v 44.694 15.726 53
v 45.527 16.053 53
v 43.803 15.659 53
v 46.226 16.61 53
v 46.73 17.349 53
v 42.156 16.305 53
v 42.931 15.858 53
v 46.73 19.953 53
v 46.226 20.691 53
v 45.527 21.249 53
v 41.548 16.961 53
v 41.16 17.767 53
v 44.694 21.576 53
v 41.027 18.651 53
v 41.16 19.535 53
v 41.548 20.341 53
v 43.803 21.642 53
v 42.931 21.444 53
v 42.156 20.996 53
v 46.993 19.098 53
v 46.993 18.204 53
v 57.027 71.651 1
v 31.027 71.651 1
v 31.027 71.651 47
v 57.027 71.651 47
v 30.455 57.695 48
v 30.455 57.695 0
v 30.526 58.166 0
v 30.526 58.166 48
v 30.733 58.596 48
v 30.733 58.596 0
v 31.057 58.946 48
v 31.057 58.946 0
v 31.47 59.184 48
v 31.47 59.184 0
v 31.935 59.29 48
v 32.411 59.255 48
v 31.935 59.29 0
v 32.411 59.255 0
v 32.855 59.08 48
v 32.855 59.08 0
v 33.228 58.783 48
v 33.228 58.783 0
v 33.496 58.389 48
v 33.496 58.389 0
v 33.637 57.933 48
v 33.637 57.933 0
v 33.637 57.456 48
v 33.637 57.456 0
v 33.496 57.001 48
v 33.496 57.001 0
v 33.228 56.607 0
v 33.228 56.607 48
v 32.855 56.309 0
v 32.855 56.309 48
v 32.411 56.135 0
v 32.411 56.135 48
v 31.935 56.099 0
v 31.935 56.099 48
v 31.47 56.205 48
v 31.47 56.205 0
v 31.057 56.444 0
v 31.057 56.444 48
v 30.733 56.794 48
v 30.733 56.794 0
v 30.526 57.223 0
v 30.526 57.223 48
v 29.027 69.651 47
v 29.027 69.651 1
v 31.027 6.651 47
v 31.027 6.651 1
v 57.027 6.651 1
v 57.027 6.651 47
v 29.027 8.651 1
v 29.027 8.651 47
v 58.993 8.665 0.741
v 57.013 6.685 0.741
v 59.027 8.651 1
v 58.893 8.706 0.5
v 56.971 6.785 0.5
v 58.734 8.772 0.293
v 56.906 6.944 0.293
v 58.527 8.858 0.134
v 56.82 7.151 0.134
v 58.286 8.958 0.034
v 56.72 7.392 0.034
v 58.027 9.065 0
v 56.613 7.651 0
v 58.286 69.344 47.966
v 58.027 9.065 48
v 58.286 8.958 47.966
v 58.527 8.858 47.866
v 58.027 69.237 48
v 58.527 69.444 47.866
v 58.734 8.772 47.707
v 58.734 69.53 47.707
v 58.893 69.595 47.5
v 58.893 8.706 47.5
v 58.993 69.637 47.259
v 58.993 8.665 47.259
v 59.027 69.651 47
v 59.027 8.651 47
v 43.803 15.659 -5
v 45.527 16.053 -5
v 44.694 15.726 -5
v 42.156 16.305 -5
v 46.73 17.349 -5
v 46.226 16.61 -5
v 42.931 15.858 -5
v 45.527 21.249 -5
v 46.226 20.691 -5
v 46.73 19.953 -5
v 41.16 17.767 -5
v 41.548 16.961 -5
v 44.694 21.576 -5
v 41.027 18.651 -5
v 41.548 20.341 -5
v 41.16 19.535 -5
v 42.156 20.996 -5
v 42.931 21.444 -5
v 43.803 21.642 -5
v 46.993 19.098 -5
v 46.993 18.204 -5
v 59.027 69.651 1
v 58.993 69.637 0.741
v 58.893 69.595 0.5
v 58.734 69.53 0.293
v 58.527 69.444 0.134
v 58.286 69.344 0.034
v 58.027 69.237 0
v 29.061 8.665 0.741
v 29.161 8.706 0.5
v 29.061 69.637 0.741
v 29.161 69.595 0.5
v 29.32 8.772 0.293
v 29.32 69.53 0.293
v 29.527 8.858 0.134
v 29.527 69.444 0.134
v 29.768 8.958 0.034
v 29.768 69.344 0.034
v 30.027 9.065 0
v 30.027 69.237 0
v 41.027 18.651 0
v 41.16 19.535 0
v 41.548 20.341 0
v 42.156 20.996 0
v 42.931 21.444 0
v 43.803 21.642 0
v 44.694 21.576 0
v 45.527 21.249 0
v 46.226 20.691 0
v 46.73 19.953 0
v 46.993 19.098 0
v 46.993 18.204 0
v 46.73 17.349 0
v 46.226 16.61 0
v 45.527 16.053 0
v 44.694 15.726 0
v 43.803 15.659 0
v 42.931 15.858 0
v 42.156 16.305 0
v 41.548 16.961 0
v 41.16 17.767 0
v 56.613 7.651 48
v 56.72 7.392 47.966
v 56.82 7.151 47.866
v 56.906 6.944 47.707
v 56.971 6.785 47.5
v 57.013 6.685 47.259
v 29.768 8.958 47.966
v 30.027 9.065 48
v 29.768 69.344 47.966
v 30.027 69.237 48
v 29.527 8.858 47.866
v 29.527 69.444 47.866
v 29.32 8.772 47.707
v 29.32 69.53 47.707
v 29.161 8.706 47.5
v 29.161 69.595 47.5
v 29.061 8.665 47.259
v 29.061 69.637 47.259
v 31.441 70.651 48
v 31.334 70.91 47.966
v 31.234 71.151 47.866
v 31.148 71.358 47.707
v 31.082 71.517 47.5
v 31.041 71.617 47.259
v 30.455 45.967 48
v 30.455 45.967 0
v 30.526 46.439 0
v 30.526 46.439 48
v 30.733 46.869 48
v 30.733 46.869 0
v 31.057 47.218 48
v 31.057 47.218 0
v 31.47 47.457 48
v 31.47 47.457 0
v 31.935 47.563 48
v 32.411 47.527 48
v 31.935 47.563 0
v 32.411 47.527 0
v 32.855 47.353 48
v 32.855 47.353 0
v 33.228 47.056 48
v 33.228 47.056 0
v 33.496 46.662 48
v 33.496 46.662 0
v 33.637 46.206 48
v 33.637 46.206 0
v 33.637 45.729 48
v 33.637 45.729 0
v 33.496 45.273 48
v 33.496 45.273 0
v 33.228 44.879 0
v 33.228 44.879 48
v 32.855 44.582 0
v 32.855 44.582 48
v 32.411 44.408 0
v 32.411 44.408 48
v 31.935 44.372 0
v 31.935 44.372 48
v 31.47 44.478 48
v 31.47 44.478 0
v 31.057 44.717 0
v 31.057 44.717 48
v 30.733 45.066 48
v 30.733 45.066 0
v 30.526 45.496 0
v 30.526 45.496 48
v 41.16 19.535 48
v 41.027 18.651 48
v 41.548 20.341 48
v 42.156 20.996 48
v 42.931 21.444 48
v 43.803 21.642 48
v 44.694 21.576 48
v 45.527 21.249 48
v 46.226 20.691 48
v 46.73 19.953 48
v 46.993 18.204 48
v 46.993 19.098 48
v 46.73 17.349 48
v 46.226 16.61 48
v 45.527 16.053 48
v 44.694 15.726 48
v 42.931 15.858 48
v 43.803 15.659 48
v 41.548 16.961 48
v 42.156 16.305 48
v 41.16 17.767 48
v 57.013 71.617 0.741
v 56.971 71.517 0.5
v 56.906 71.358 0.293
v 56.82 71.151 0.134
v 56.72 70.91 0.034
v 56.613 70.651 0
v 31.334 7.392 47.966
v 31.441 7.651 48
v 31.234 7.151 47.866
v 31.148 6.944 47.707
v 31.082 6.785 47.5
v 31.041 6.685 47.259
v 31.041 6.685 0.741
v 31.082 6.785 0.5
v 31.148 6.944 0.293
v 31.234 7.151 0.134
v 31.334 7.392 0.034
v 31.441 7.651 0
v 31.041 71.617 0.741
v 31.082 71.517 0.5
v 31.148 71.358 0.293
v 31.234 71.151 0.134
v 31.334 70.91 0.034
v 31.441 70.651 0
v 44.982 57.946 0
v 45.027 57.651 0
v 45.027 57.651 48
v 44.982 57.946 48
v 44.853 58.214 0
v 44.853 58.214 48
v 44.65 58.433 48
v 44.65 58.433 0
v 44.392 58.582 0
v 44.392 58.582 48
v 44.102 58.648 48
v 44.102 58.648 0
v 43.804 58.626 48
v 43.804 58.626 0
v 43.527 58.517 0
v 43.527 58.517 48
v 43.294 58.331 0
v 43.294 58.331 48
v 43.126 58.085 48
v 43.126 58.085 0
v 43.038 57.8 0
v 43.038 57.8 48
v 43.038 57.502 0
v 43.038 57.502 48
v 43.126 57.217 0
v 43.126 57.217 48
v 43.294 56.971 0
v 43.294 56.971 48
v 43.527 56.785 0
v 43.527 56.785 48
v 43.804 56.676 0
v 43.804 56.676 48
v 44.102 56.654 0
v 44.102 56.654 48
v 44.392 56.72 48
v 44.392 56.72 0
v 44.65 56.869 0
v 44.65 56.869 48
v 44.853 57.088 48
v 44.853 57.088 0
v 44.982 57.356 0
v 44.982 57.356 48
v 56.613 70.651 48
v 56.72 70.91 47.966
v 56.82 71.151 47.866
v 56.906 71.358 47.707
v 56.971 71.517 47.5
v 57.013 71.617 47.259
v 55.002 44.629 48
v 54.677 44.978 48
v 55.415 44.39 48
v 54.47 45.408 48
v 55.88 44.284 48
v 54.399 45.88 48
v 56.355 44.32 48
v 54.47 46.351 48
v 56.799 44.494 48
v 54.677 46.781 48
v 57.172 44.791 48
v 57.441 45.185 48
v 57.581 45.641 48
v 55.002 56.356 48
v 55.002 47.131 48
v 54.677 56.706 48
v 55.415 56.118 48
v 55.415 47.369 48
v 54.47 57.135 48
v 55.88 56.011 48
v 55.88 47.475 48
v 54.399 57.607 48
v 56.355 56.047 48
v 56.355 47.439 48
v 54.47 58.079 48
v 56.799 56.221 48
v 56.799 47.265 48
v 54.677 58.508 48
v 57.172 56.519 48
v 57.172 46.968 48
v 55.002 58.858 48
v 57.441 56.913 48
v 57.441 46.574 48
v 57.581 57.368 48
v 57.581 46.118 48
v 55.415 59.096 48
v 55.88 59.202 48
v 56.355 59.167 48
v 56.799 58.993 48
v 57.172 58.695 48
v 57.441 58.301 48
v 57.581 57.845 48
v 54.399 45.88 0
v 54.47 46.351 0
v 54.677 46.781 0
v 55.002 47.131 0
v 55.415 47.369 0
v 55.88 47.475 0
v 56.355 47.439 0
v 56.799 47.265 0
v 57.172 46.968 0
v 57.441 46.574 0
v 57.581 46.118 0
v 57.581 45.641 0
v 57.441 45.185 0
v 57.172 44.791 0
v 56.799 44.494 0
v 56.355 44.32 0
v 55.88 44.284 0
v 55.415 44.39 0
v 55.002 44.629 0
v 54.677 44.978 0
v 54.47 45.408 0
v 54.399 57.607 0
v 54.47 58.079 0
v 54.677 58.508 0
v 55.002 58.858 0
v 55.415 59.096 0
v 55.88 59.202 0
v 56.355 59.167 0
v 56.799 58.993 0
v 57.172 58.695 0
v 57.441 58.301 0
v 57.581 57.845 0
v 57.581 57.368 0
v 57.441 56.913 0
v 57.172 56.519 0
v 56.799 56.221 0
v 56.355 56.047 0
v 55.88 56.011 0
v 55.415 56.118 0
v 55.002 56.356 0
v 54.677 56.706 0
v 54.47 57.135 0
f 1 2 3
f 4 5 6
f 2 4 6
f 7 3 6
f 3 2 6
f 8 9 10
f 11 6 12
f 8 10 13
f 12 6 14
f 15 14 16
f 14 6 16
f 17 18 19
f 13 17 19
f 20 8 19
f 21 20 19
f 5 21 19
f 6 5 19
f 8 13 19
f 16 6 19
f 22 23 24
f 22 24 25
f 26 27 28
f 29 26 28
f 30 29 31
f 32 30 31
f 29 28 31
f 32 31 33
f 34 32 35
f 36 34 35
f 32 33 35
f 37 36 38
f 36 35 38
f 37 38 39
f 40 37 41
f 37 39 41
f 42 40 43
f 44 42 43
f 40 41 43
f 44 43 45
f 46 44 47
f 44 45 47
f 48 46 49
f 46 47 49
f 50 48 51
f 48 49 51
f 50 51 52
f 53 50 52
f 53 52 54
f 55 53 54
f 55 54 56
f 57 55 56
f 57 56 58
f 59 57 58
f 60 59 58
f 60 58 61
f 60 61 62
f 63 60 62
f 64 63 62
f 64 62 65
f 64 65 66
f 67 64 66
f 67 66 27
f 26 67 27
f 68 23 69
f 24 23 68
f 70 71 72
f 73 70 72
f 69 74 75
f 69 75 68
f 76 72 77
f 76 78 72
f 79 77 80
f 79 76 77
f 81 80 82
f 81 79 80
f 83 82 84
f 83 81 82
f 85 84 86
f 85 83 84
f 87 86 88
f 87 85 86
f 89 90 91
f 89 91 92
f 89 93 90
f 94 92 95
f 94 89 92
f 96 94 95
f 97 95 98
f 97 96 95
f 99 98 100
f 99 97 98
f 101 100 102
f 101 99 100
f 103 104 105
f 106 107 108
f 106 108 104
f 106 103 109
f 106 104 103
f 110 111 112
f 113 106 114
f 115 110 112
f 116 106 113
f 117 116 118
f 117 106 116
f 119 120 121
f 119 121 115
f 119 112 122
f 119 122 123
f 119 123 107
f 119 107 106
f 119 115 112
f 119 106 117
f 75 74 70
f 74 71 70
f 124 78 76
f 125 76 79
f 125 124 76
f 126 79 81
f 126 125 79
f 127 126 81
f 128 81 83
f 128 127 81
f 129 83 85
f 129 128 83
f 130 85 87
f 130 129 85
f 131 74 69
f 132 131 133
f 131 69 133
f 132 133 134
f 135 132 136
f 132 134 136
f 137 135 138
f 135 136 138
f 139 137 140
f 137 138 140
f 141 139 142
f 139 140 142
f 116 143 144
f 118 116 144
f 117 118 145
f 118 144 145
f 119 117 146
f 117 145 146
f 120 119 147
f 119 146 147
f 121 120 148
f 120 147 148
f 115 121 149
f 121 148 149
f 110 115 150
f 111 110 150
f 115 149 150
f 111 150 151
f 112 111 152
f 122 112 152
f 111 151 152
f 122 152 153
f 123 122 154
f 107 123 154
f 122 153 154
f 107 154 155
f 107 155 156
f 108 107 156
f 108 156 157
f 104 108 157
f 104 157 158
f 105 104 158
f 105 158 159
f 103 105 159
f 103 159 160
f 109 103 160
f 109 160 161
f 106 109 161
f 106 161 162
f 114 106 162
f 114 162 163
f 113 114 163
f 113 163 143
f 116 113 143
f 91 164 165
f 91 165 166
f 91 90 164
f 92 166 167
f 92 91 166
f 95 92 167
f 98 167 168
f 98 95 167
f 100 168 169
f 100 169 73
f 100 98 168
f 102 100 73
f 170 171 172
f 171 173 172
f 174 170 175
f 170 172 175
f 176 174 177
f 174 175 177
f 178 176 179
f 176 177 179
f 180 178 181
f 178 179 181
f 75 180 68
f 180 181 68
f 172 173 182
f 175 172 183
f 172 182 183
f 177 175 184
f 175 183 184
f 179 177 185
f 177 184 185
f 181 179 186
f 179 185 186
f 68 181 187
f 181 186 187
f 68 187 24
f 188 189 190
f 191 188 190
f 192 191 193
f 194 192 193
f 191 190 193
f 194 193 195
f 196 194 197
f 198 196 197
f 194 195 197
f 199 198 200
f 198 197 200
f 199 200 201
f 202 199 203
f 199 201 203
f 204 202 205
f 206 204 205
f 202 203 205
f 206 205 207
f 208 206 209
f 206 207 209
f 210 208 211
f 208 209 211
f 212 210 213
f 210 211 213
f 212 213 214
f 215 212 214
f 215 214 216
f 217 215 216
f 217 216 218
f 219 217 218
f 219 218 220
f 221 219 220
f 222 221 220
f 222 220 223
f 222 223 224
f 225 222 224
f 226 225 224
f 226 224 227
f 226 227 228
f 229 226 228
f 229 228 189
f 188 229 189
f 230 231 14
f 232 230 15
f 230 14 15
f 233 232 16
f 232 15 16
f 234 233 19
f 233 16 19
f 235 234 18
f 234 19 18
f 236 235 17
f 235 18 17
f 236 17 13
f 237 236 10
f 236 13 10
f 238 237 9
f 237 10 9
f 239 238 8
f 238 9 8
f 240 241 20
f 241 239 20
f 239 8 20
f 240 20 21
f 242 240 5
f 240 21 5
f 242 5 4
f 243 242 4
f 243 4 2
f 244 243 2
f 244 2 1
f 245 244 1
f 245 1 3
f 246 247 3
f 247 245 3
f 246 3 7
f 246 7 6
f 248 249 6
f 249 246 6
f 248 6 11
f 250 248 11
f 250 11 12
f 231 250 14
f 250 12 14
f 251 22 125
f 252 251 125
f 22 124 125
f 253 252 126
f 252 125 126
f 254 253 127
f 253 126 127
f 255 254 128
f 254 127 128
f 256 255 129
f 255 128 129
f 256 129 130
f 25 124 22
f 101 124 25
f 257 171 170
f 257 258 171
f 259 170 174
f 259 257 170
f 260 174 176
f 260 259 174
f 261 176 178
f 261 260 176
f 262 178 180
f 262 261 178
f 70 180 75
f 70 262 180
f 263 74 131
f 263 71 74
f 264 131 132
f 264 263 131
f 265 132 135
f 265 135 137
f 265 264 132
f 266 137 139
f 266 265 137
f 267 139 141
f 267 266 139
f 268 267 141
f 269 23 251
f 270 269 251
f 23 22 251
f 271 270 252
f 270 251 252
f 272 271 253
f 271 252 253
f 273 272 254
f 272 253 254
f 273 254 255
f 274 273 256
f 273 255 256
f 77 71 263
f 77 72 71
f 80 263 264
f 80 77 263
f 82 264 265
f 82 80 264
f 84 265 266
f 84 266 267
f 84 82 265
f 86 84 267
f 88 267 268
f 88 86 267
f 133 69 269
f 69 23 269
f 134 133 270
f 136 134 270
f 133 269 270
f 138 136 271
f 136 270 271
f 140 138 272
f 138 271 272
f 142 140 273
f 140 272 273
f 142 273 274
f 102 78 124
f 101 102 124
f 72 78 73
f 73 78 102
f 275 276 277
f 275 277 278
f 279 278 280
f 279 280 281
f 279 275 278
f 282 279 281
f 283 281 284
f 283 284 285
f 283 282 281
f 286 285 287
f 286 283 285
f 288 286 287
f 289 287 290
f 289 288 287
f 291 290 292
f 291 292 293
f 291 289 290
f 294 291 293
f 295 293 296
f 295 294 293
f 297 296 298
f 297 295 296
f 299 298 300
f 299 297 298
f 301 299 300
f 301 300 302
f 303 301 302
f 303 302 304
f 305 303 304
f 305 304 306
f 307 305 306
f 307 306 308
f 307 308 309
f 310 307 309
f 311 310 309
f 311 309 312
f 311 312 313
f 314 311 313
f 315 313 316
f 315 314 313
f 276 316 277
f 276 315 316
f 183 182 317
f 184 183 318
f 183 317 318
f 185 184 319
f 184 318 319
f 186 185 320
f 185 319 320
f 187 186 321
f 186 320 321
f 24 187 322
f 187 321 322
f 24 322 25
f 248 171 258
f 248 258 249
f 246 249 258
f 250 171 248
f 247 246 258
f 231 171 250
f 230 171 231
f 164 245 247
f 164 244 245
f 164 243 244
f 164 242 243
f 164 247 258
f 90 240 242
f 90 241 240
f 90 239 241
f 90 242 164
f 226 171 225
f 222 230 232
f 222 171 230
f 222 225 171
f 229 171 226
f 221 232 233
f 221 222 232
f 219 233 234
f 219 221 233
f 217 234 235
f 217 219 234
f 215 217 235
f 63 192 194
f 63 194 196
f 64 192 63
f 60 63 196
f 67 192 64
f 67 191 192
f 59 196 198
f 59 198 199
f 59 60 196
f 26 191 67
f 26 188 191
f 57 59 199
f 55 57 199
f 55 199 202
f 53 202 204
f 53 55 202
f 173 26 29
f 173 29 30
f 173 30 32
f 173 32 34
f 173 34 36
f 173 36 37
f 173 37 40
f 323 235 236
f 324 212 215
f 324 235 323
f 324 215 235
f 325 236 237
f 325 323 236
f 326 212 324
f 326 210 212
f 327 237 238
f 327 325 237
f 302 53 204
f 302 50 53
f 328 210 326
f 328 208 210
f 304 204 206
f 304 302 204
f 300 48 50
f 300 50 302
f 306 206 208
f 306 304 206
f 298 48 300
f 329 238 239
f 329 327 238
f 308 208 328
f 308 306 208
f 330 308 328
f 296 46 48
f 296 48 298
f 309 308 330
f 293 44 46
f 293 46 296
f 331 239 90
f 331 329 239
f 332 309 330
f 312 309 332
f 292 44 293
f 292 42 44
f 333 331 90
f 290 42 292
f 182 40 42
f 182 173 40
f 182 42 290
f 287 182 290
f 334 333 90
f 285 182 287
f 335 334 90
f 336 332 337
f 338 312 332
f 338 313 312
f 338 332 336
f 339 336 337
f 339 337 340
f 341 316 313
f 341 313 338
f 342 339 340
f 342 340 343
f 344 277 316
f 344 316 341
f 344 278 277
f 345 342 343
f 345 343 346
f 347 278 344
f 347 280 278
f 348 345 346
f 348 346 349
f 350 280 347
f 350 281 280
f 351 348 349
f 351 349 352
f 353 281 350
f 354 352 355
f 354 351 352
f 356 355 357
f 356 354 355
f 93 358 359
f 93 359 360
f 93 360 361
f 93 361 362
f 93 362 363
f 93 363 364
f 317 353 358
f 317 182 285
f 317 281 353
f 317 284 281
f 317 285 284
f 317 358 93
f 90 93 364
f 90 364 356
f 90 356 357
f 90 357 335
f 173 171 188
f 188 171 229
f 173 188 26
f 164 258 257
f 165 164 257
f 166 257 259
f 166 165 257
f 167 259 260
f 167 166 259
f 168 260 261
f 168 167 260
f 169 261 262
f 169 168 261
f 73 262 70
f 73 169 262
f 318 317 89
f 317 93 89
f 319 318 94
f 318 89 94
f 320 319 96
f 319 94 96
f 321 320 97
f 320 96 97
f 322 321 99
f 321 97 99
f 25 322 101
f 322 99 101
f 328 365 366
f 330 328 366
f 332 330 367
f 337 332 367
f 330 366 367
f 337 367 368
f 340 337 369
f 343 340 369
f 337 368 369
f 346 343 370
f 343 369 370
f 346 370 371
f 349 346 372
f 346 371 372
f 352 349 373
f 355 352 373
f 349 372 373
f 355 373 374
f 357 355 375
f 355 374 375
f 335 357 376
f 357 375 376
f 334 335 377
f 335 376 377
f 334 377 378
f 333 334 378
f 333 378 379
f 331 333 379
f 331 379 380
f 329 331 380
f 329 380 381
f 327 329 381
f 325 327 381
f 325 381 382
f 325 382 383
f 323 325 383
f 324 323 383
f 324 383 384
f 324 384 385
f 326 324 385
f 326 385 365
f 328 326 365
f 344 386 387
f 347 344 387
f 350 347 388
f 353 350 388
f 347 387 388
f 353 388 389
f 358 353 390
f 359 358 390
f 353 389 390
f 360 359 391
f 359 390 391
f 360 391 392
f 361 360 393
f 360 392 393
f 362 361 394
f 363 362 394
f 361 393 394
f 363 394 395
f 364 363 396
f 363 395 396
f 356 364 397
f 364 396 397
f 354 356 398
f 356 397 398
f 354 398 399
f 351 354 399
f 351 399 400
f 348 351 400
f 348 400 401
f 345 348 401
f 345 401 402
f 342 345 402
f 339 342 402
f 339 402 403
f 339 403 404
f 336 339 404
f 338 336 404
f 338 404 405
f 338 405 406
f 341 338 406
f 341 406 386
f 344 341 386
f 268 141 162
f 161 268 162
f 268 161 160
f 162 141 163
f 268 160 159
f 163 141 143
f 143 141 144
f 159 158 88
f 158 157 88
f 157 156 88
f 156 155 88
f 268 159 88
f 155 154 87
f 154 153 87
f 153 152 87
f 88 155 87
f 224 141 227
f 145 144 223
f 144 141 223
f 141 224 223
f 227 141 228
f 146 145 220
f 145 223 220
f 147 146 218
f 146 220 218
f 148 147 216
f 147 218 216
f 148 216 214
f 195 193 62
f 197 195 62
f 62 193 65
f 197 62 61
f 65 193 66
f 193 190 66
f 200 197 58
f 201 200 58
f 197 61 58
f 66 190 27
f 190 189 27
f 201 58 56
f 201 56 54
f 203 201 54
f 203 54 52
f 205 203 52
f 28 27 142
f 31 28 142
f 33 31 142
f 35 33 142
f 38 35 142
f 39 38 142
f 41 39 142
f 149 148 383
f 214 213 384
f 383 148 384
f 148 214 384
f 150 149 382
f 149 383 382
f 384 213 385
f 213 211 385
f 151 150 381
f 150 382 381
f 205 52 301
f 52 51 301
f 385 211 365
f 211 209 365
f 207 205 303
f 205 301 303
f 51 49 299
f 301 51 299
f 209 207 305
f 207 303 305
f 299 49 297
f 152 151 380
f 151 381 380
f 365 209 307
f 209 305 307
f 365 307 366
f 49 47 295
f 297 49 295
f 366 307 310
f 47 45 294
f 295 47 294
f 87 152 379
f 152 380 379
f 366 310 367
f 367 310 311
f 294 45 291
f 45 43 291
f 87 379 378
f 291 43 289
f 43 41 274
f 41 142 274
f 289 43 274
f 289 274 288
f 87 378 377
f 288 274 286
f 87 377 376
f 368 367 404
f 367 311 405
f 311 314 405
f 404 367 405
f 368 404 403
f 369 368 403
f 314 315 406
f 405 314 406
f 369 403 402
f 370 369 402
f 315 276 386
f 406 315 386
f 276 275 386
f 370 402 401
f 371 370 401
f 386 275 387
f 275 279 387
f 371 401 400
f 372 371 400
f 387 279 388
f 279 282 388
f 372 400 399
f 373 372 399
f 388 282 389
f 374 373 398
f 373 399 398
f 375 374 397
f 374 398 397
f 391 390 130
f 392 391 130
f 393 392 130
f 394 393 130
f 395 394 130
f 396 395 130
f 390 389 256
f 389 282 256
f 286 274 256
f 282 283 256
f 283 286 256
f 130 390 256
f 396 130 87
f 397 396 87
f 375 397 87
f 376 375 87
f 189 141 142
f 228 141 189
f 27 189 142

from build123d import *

# Parameters (mm, degrees)
SKETCH_1_W           = 30
SKETCH_1_H           = 65
EXTRUDE_1_DEPTH      = 48
SKETCH_2_R           = 1
CUT_EXTRUDE_1_DEPTH  = 48
EXTRUDE_2_DEPTH      = 5
EXTRUDE_2_DEPTH_BACK = 53
SKETCH_3_R           = 3
CHAMFER_1_SIZE       = 2
FILLET_1_R           = 1
FILLET_2_R           = 1
SKETCH_6_R           = 1.6
SKETCH_6_R_2         = 1
CUT_EXTRUDE_3_DEPTH  = 76


with BuildPart() as part:
    # ｽｹｯﾁ1 → ﾎﾞｽ - 押し出し1 (new body)
    with BuildSketch(Plane.XY):
        with Locations((44.026916893, 39.150883092)):
            Rectangle(SKETCH_1_W, SKETCH_1_H)
    extrude(amount=EXTRUDE_1_DEPTH)

    # ｽｹｯﾁ2 → ｶｯﾄ - 押し出し1 (cut)
    with BuildSketch(Plane.XY):
        with Locations((56.026916893, 57.650883092)):
            Circle(SKETCH_2_R)
        with Locations((32.026916893, 57.650883092)):
            Circle(SKETCH_2_R)
        with Locations((44.026916893, 57.650883092)):
            Circle(SKETCH_2_R)
        with Locations((56.023819064, 45.923533591)):
            Circle(SKETCH_2_R)
        with Locations((32.030014722, 45.923533591)):
            Circle(SKETCH_2_R)
    extrude(amount=CUT_EXTRUDE_1_DEPTH, mode=Mode.SUBTRACT)

    # ｽｹｯﾁ3 → ﾎﾞｽ - 押し出し2 (add, two sides: drawn at the far end of the back side and taken through both)
    with BuildSketch(Plane(origin=(0, 0, 0), x_dir=(-1, 0, 0), z_dir=(0, 0, -1)).offset(-EXTRUDE_2_DEPTH_BACK)):
        with Locations((-44.026916893, 18.650883092)):
            Circle(SKETCH_3_R)
    extrude(amount=EXTRUDE_2_DEPTH + EXTRUDE_2_DEPTH_BACK)

    # 面取り1
    chamfer_1_edges = [part.edges().sort_by_distance(p)[0] for p in [
        (29.026916893, 6.650883092, 24),
        (59.026916893, 6.650883092, 24),
        (59.026916893, 71.650883092, 24),
        (29.026916893, 71.650883092, 24),
    ]]
    chamfer(chamfer_1_edges, length=CHAMFER_1_SIZE)

    # ﾌｨﾚｯﾄ1
    fillet_1_edges = [part.edges().sort_by_distance(p)[0] for p in [
        (30.026916893, 70.650883092, 48),
        (44.026916893, 71.650883092, 48),
        (58.026916893, 70.650883092, 48),
        (29.026916893, 39.150883092, 48),
        (30.026916893, 7.650883092, 48),
        (44.026916893, 6.650883092, 48),
        (58.026916893, 7.650883092, 48),
        (59.026916893, 39.150883092, 48),
    ]]
    fillet(fillet_1_edges, radius=FILLET_1_R)

    # ﾌｨﾚｯﾄ2
    fillet_2_edges = [part.edges().sort_by_distance(p)[0] for p in [
        (58.026916893, 70.650883092, 0),
        (30.026916893, 70.650883092, 0),
        (44.026916893, 71.650883092, 0),
        (29.026916893, 39.150883092, 0),
        (30.026916893, 7.650883092, 0),
        (44.026916893, 6.650883092, 0),
        (58.026916893, 7.650883092, 0),
        (59.026916893, 39.150883092, 0),
    ]]
    fillet(fillet_2_edges, radius=FILLET_2_R)

    # ｽｹｯﾁ6 → ｶｯﾄ - 押し出し3 (cut)
    # profile 1 of 4: a face of its own
    with BuildSketch(Plane(origin=(0, 0, 0), x_dir=(-1, 0, 0), z_dir=(0, 0, -1))):
        with Locations((-55.99912174, 45.879603206)):
            Circle(SKETCH_6_R)
        with Locations((-56.023819064, 45.923533591)):
            Circle(SKETCH_6_R_2, mode=Mode.SUBTRACT)
    # profile 2 of 4: a face of its own
    with BuildSketch(Plane(origin=(0, 0, 0), x_dir=(-1, 0, 0), z_dir=(0, 0, -1))):
        with Locations((-32.054712046, 45.967463976)):
            Circle(SKETCH_6_R)
    # profile 3 of 4: a face of its own
    with BuildSketch(Plane(origin=(0, 0, 0), x_dir=(-1, 0, 0), z_dir=(0, 0, -1))):
        with Locations((-55.99912174, 57.606952707)):
            Circle(SKETCH_6_R)
    # profile 4 of 4: a face of its own
    with BuildSketch(Plane(origin=(0, 0, 0), x_dir=(-1, 0, 0), z_dir=(0, 0, -1))):
        with Locations((-32.054712046, 57.694813478)):
            Circle(SKETCH_6_R)
    extrude(amount=-CUT_EXTRUDE_3_DEPTH, mode=Mode.SUBTRACT)


solid = part.part
